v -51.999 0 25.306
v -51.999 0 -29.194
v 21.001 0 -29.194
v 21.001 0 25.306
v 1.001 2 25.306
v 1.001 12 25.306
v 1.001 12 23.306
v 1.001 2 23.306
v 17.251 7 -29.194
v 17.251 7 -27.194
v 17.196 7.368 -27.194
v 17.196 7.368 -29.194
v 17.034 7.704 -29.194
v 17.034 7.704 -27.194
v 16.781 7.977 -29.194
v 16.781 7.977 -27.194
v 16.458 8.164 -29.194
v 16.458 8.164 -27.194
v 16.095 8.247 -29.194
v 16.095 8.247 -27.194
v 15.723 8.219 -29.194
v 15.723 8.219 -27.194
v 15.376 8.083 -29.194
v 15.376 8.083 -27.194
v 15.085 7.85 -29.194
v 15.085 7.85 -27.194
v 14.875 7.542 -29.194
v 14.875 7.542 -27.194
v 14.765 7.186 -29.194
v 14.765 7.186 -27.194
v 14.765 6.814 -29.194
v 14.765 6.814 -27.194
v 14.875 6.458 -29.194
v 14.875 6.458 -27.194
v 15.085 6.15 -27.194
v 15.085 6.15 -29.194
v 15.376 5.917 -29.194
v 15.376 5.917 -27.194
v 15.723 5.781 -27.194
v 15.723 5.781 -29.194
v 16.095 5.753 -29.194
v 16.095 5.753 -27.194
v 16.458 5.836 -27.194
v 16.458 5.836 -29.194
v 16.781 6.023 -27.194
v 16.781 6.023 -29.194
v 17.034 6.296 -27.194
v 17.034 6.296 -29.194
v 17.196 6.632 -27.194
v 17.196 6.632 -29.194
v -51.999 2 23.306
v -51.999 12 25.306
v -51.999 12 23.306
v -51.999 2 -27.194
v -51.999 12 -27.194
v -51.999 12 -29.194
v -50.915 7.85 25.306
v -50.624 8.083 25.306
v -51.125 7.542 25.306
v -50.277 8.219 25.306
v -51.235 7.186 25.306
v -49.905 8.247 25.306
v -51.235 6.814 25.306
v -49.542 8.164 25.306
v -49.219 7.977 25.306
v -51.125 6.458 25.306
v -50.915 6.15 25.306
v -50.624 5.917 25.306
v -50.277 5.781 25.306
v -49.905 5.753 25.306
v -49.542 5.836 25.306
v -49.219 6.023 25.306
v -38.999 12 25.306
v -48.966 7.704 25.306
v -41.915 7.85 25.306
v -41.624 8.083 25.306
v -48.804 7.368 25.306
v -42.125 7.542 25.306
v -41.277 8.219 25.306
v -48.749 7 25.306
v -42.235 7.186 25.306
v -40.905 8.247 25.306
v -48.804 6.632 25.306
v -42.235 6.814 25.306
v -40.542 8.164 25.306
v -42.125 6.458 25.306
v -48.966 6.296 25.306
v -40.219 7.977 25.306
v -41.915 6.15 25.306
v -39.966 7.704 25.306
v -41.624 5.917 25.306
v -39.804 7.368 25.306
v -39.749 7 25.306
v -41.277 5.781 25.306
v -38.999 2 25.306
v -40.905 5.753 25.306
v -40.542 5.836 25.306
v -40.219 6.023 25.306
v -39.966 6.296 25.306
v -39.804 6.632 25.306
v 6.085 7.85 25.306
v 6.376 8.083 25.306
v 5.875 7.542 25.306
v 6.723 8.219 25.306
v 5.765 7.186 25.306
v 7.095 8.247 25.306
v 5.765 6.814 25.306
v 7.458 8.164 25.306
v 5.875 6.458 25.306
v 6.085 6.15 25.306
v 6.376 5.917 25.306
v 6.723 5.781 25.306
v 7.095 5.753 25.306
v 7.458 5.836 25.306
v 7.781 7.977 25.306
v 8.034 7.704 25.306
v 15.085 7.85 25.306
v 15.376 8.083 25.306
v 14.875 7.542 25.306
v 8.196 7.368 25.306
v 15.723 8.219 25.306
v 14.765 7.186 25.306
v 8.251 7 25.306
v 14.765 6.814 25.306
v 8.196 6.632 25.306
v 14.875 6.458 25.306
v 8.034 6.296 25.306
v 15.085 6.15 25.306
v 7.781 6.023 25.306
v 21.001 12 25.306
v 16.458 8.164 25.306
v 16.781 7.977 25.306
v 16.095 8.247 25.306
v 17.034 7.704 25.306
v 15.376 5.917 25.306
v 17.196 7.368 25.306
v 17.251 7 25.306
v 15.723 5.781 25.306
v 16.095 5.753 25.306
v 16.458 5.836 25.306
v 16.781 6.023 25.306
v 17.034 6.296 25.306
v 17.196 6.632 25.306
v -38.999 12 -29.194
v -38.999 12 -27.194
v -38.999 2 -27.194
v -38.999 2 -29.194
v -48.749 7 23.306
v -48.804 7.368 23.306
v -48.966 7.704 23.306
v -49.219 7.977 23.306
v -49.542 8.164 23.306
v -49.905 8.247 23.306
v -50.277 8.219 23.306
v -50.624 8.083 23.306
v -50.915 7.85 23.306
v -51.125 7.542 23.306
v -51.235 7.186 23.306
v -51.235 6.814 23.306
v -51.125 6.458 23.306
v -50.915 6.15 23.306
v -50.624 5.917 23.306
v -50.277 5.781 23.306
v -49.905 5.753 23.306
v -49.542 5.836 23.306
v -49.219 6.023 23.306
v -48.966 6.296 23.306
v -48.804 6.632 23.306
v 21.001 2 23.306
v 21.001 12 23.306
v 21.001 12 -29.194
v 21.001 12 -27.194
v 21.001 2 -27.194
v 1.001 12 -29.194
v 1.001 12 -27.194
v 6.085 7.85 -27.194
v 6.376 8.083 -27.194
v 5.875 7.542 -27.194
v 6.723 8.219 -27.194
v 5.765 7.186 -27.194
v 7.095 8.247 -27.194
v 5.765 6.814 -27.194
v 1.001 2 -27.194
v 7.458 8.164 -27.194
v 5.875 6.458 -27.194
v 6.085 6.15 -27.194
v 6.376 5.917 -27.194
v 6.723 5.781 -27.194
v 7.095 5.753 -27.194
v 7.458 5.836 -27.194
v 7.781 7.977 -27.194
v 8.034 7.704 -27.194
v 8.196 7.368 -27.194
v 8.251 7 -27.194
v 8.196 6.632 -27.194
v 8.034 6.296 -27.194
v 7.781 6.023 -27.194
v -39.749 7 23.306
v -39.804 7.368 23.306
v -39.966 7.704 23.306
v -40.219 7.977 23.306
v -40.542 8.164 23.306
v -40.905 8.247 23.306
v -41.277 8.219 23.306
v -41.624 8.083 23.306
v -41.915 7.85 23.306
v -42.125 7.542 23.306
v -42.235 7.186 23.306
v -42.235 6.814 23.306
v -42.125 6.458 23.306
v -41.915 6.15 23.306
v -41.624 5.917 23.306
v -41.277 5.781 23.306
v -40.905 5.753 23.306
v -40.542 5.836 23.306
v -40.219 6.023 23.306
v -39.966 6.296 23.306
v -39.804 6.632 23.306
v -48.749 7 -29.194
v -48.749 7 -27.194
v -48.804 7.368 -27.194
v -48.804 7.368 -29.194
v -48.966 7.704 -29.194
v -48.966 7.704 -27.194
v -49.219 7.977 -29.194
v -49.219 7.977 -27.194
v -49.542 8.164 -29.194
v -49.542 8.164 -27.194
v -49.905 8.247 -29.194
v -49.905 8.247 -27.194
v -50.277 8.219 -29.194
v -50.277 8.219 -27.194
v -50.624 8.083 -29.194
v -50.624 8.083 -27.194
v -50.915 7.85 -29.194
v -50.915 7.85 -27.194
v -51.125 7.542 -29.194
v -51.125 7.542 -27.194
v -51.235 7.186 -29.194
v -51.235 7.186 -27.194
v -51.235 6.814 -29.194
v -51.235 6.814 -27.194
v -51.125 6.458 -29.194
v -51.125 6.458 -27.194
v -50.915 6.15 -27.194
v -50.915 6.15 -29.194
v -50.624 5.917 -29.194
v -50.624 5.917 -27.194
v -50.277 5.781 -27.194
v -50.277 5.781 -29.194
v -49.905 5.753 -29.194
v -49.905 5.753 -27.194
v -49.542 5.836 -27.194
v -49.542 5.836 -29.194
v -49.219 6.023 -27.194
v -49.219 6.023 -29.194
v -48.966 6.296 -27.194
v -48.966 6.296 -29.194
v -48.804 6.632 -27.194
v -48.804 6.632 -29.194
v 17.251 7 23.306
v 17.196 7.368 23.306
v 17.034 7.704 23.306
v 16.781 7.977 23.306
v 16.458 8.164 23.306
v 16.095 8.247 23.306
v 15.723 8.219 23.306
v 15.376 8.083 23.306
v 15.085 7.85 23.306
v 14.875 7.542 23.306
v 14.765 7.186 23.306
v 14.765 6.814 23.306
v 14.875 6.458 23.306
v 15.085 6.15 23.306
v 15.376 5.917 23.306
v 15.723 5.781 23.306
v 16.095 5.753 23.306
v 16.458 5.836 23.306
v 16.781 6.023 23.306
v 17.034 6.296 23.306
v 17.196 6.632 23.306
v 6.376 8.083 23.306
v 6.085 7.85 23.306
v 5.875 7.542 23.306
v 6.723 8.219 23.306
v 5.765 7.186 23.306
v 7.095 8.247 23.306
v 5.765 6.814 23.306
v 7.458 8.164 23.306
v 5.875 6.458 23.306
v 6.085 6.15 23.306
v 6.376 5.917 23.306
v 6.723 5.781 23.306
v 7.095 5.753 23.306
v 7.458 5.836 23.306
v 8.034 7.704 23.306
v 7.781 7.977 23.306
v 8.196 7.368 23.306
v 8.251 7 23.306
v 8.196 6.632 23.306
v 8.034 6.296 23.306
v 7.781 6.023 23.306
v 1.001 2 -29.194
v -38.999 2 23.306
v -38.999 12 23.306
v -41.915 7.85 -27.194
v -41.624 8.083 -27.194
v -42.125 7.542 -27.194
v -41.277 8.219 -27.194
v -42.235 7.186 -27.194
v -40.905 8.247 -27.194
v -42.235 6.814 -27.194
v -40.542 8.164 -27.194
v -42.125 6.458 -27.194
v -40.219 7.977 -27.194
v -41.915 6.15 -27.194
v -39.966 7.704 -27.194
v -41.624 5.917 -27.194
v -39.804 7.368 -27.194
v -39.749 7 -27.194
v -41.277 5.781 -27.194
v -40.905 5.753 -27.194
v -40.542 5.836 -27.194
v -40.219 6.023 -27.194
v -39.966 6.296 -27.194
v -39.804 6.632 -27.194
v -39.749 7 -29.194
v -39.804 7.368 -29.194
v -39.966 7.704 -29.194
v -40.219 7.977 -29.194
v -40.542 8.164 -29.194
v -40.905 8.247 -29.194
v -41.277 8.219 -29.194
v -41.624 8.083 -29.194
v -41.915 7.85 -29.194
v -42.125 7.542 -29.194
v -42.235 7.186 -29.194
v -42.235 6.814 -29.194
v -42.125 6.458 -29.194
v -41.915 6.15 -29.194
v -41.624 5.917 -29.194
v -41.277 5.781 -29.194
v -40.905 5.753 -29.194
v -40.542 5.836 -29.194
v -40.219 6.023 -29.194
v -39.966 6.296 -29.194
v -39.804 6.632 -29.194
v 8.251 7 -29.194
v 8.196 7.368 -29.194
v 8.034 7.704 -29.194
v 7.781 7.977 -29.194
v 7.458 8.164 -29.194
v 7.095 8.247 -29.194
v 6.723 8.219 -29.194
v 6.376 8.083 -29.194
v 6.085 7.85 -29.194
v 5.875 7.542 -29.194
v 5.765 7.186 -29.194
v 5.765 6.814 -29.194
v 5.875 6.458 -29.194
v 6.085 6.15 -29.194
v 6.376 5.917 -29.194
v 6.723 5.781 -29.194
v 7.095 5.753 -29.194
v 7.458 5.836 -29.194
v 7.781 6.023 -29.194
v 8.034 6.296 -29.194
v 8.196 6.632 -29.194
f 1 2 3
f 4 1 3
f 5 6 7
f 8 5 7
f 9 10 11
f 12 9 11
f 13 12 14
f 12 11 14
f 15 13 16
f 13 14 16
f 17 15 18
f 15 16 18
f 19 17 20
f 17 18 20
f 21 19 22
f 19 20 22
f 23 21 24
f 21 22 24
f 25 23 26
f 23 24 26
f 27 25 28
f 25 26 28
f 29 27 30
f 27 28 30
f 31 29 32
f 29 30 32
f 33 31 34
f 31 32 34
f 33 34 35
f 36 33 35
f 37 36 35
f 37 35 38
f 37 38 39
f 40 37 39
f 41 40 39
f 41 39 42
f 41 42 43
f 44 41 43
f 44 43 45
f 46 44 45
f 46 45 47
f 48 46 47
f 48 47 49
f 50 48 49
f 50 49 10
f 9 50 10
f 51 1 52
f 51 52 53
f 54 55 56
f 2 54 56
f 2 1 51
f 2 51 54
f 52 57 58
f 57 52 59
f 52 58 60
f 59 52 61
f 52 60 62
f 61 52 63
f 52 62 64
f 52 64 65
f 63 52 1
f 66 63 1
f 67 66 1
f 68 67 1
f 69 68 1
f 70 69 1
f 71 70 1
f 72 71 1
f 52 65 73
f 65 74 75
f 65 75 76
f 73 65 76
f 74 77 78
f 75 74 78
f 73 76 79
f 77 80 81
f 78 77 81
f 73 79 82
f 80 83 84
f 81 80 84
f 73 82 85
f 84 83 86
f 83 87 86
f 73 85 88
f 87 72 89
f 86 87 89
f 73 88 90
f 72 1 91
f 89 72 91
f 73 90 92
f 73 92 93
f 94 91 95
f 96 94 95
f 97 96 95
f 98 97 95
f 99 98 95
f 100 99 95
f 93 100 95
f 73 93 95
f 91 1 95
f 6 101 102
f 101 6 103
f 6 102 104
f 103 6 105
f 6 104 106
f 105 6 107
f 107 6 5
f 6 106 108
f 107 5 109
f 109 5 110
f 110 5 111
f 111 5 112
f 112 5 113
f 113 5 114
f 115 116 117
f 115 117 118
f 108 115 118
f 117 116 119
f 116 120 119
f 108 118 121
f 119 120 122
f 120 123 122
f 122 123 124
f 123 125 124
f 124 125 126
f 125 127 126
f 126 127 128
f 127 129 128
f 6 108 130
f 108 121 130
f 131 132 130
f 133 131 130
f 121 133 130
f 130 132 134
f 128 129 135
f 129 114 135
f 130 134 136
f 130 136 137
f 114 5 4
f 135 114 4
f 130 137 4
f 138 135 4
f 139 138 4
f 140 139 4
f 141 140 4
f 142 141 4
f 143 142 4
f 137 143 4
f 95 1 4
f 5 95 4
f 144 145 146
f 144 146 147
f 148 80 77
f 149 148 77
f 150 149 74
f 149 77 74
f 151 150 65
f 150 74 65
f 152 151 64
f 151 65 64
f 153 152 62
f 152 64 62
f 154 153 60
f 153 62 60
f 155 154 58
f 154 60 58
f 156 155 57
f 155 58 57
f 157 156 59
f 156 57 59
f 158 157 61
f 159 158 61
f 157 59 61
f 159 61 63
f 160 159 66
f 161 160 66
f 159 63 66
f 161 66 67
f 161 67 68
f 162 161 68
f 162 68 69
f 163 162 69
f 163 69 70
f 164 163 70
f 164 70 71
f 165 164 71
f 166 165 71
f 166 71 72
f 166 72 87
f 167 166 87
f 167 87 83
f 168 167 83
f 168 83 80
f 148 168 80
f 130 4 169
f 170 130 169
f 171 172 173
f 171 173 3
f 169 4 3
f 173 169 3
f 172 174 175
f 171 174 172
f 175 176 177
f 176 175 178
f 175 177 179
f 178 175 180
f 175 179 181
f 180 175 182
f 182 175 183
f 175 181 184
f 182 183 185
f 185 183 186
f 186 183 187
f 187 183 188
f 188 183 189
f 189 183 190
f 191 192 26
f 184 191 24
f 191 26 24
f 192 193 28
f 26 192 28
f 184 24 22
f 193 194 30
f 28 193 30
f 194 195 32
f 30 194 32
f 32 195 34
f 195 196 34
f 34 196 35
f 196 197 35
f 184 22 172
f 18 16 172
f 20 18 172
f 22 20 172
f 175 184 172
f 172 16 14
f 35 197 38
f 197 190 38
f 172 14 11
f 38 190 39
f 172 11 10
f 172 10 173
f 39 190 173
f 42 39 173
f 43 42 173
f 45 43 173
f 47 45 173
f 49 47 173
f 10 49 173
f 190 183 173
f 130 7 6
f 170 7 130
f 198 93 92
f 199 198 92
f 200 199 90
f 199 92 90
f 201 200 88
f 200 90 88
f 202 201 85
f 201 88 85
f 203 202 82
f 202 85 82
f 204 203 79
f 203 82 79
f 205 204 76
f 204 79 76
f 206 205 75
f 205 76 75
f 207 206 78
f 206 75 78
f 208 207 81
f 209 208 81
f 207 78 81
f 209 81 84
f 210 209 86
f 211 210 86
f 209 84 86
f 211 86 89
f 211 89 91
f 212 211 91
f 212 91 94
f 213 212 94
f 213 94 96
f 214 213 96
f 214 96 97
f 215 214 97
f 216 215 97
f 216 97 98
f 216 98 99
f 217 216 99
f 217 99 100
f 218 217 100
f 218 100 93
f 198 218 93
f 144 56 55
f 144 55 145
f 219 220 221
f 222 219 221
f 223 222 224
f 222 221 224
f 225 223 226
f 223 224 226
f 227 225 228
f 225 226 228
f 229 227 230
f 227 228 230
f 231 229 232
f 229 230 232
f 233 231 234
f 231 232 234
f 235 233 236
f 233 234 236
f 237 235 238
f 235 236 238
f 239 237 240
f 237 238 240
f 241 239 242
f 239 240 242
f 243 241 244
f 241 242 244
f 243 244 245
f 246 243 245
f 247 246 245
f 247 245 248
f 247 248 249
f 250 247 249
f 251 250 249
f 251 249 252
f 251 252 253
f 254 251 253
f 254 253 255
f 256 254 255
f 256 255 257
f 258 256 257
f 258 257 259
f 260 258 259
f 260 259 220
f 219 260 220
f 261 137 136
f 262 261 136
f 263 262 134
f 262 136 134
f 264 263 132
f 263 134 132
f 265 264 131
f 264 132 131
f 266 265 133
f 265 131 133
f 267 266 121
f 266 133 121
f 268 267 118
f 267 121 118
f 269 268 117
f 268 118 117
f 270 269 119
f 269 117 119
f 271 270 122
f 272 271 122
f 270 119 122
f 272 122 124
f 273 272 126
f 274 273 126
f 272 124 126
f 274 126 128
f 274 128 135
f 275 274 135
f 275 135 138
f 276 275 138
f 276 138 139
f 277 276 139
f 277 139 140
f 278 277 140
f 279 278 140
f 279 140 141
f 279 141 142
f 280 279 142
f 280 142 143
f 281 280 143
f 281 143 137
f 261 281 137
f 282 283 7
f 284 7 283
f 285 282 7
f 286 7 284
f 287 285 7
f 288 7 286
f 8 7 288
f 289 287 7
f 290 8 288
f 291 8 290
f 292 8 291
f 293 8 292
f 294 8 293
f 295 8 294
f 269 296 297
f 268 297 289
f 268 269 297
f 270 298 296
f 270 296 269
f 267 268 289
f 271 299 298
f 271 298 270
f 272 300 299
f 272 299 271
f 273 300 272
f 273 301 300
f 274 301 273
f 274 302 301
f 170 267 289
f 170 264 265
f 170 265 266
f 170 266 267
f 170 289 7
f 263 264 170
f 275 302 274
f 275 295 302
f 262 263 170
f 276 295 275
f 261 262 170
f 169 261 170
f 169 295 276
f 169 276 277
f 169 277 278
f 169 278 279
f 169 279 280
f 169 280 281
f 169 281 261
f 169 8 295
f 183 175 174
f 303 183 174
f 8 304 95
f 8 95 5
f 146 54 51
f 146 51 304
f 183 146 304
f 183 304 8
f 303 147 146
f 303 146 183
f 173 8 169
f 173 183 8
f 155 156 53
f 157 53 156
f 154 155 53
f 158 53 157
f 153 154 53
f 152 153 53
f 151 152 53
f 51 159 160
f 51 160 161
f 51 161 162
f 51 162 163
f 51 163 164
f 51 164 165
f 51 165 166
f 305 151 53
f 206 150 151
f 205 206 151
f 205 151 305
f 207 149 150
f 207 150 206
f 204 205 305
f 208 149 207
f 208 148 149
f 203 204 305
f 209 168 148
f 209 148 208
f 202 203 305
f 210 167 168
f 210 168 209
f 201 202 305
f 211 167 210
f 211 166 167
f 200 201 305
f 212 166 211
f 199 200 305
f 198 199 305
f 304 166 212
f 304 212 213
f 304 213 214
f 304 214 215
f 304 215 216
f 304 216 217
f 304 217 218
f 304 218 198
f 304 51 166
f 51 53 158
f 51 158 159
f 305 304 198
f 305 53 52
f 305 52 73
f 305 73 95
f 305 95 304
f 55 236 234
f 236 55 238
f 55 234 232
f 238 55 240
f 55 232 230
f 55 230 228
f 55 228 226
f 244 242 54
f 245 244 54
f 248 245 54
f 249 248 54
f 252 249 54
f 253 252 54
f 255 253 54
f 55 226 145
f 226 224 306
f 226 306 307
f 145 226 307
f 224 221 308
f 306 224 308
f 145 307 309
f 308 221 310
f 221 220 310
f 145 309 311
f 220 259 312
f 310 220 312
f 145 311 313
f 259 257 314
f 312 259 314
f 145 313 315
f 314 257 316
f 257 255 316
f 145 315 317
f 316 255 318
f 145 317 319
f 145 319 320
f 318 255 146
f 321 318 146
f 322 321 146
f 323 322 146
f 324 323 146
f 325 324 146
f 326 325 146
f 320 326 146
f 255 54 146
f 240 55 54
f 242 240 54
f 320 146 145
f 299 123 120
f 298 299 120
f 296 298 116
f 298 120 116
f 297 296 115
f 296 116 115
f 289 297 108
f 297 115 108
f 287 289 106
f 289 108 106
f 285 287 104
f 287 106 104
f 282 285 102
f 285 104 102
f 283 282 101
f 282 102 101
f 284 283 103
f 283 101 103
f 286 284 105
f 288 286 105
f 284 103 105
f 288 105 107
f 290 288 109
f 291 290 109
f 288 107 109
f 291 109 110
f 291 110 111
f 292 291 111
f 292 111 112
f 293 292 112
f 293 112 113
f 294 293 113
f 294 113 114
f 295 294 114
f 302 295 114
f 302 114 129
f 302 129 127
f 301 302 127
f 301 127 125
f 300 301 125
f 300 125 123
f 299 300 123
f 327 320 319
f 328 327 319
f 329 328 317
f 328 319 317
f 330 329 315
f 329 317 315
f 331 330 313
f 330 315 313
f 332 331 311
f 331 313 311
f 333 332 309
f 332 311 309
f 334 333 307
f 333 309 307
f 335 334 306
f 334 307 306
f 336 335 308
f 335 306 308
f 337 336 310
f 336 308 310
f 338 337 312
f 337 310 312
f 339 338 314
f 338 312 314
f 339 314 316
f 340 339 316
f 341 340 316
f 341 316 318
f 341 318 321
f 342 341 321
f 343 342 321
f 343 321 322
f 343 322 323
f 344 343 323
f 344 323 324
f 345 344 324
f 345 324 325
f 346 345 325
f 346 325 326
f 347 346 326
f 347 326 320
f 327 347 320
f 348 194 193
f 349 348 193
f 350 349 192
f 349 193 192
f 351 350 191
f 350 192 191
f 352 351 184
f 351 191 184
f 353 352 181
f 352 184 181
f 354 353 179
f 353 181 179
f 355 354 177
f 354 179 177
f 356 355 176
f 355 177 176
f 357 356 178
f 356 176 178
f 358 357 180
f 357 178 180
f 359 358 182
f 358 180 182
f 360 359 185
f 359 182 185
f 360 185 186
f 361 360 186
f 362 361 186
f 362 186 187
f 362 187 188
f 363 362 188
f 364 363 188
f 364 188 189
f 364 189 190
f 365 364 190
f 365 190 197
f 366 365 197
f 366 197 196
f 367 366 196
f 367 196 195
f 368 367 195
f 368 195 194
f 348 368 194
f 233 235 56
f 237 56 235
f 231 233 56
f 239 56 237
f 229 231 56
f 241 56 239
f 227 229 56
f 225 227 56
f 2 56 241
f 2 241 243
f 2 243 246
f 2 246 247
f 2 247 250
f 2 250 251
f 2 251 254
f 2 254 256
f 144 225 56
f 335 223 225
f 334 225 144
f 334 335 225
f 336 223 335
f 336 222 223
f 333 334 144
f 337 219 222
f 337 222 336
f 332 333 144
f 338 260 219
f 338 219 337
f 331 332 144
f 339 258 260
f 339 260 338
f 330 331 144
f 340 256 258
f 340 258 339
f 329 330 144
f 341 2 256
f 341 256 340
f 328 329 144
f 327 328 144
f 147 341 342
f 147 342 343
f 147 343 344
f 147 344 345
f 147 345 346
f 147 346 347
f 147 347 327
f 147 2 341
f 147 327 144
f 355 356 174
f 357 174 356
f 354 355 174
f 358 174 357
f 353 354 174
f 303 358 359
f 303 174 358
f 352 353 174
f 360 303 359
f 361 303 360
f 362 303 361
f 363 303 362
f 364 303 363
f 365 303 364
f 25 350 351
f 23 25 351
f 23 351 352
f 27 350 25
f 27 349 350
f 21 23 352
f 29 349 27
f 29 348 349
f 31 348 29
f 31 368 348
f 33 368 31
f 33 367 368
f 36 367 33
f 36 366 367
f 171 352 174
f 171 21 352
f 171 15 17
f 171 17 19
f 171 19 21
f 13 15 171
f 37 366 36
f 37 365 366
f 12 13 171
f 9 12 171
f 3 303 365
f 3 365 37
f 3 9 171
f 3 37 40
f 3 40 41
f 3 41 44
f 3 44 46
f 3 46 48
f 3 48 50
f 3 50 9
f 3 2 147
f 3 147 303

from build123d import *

# Parameters (mm, degrees)
SKETCH1_W           = 73
SKETCH1_H           = 54.5
BOSS_EXTRUDE1_DEPTH = 2
SKETCH2_W           = 20
SKETCH2_H           = 2
SKETCH2_W_2         = 13
BOSS_EXTRUDE2_DEPTH = 10
SKETCH3_R           = 1.25
CUT_EXTRUDE1_DEPTH  = 55.5


with BuildPart() as part:
    # Sketch1 → Boss-Extrude1 (new body)
    with BuildSketch(Plane(origin=(0, 0, 0), x_dir=(1, 0, 0), z_dir=(0, 1, 0))):
        with Locations((-15.498549405, 1.944031796)):
            Rectangle(SKETCH1_W, SKETCH1_H)
    extrude(amount=BOSS_EXTRUDE1_DEPTH)

    # Sketch2 → Boss-Extrude2 (add)
    with BuildSketch(Plane(origin=(0, 2, 0), x_dir=(1, 0, 0), z_dir=(0, 1, 0))):
        with Locations((11.001450595, 28.194031796)):
            Rectangle(SKETCH2_W, SKETCH2_H)
        with Locations((11.001450595, -24.305968204)):
            Rectangle(SKETCH2_W, SKETCH2_H)
        with Locations((-45.498549405, 28.194031796)):
            Rectangle(SKETCH2_W_2, SKETCH2_H)
        with Locations((-45.498549405, -24.305968204)):
            Rectangle(SKETCH2_W_2, SKETCH2_H)
    extrude(amount=BOSS_EXTRUDE2_DEPTH)

    # Sketch3 → Cut-Extrude1 (cut, through all)
    with BuildSketch(Plane.XY.offset(25.305968204)):
        with Locations((16.001450595, 7)):
            Circle(SKETCH3_R)
        with Locations((7.001450595, 7)):
            Circle(SKETCH3_R)
        with Locations((-40.998549405, 7)):
            Circle(SKETCH3_R)
        with Locations((-49.998549405, 7)):
            Circle(SKETCH3_R)
    extrude(amount=-CUT_EXTRUDE1_DEPTH, mode=Mode.SUBTRACT)


solid = part.part
